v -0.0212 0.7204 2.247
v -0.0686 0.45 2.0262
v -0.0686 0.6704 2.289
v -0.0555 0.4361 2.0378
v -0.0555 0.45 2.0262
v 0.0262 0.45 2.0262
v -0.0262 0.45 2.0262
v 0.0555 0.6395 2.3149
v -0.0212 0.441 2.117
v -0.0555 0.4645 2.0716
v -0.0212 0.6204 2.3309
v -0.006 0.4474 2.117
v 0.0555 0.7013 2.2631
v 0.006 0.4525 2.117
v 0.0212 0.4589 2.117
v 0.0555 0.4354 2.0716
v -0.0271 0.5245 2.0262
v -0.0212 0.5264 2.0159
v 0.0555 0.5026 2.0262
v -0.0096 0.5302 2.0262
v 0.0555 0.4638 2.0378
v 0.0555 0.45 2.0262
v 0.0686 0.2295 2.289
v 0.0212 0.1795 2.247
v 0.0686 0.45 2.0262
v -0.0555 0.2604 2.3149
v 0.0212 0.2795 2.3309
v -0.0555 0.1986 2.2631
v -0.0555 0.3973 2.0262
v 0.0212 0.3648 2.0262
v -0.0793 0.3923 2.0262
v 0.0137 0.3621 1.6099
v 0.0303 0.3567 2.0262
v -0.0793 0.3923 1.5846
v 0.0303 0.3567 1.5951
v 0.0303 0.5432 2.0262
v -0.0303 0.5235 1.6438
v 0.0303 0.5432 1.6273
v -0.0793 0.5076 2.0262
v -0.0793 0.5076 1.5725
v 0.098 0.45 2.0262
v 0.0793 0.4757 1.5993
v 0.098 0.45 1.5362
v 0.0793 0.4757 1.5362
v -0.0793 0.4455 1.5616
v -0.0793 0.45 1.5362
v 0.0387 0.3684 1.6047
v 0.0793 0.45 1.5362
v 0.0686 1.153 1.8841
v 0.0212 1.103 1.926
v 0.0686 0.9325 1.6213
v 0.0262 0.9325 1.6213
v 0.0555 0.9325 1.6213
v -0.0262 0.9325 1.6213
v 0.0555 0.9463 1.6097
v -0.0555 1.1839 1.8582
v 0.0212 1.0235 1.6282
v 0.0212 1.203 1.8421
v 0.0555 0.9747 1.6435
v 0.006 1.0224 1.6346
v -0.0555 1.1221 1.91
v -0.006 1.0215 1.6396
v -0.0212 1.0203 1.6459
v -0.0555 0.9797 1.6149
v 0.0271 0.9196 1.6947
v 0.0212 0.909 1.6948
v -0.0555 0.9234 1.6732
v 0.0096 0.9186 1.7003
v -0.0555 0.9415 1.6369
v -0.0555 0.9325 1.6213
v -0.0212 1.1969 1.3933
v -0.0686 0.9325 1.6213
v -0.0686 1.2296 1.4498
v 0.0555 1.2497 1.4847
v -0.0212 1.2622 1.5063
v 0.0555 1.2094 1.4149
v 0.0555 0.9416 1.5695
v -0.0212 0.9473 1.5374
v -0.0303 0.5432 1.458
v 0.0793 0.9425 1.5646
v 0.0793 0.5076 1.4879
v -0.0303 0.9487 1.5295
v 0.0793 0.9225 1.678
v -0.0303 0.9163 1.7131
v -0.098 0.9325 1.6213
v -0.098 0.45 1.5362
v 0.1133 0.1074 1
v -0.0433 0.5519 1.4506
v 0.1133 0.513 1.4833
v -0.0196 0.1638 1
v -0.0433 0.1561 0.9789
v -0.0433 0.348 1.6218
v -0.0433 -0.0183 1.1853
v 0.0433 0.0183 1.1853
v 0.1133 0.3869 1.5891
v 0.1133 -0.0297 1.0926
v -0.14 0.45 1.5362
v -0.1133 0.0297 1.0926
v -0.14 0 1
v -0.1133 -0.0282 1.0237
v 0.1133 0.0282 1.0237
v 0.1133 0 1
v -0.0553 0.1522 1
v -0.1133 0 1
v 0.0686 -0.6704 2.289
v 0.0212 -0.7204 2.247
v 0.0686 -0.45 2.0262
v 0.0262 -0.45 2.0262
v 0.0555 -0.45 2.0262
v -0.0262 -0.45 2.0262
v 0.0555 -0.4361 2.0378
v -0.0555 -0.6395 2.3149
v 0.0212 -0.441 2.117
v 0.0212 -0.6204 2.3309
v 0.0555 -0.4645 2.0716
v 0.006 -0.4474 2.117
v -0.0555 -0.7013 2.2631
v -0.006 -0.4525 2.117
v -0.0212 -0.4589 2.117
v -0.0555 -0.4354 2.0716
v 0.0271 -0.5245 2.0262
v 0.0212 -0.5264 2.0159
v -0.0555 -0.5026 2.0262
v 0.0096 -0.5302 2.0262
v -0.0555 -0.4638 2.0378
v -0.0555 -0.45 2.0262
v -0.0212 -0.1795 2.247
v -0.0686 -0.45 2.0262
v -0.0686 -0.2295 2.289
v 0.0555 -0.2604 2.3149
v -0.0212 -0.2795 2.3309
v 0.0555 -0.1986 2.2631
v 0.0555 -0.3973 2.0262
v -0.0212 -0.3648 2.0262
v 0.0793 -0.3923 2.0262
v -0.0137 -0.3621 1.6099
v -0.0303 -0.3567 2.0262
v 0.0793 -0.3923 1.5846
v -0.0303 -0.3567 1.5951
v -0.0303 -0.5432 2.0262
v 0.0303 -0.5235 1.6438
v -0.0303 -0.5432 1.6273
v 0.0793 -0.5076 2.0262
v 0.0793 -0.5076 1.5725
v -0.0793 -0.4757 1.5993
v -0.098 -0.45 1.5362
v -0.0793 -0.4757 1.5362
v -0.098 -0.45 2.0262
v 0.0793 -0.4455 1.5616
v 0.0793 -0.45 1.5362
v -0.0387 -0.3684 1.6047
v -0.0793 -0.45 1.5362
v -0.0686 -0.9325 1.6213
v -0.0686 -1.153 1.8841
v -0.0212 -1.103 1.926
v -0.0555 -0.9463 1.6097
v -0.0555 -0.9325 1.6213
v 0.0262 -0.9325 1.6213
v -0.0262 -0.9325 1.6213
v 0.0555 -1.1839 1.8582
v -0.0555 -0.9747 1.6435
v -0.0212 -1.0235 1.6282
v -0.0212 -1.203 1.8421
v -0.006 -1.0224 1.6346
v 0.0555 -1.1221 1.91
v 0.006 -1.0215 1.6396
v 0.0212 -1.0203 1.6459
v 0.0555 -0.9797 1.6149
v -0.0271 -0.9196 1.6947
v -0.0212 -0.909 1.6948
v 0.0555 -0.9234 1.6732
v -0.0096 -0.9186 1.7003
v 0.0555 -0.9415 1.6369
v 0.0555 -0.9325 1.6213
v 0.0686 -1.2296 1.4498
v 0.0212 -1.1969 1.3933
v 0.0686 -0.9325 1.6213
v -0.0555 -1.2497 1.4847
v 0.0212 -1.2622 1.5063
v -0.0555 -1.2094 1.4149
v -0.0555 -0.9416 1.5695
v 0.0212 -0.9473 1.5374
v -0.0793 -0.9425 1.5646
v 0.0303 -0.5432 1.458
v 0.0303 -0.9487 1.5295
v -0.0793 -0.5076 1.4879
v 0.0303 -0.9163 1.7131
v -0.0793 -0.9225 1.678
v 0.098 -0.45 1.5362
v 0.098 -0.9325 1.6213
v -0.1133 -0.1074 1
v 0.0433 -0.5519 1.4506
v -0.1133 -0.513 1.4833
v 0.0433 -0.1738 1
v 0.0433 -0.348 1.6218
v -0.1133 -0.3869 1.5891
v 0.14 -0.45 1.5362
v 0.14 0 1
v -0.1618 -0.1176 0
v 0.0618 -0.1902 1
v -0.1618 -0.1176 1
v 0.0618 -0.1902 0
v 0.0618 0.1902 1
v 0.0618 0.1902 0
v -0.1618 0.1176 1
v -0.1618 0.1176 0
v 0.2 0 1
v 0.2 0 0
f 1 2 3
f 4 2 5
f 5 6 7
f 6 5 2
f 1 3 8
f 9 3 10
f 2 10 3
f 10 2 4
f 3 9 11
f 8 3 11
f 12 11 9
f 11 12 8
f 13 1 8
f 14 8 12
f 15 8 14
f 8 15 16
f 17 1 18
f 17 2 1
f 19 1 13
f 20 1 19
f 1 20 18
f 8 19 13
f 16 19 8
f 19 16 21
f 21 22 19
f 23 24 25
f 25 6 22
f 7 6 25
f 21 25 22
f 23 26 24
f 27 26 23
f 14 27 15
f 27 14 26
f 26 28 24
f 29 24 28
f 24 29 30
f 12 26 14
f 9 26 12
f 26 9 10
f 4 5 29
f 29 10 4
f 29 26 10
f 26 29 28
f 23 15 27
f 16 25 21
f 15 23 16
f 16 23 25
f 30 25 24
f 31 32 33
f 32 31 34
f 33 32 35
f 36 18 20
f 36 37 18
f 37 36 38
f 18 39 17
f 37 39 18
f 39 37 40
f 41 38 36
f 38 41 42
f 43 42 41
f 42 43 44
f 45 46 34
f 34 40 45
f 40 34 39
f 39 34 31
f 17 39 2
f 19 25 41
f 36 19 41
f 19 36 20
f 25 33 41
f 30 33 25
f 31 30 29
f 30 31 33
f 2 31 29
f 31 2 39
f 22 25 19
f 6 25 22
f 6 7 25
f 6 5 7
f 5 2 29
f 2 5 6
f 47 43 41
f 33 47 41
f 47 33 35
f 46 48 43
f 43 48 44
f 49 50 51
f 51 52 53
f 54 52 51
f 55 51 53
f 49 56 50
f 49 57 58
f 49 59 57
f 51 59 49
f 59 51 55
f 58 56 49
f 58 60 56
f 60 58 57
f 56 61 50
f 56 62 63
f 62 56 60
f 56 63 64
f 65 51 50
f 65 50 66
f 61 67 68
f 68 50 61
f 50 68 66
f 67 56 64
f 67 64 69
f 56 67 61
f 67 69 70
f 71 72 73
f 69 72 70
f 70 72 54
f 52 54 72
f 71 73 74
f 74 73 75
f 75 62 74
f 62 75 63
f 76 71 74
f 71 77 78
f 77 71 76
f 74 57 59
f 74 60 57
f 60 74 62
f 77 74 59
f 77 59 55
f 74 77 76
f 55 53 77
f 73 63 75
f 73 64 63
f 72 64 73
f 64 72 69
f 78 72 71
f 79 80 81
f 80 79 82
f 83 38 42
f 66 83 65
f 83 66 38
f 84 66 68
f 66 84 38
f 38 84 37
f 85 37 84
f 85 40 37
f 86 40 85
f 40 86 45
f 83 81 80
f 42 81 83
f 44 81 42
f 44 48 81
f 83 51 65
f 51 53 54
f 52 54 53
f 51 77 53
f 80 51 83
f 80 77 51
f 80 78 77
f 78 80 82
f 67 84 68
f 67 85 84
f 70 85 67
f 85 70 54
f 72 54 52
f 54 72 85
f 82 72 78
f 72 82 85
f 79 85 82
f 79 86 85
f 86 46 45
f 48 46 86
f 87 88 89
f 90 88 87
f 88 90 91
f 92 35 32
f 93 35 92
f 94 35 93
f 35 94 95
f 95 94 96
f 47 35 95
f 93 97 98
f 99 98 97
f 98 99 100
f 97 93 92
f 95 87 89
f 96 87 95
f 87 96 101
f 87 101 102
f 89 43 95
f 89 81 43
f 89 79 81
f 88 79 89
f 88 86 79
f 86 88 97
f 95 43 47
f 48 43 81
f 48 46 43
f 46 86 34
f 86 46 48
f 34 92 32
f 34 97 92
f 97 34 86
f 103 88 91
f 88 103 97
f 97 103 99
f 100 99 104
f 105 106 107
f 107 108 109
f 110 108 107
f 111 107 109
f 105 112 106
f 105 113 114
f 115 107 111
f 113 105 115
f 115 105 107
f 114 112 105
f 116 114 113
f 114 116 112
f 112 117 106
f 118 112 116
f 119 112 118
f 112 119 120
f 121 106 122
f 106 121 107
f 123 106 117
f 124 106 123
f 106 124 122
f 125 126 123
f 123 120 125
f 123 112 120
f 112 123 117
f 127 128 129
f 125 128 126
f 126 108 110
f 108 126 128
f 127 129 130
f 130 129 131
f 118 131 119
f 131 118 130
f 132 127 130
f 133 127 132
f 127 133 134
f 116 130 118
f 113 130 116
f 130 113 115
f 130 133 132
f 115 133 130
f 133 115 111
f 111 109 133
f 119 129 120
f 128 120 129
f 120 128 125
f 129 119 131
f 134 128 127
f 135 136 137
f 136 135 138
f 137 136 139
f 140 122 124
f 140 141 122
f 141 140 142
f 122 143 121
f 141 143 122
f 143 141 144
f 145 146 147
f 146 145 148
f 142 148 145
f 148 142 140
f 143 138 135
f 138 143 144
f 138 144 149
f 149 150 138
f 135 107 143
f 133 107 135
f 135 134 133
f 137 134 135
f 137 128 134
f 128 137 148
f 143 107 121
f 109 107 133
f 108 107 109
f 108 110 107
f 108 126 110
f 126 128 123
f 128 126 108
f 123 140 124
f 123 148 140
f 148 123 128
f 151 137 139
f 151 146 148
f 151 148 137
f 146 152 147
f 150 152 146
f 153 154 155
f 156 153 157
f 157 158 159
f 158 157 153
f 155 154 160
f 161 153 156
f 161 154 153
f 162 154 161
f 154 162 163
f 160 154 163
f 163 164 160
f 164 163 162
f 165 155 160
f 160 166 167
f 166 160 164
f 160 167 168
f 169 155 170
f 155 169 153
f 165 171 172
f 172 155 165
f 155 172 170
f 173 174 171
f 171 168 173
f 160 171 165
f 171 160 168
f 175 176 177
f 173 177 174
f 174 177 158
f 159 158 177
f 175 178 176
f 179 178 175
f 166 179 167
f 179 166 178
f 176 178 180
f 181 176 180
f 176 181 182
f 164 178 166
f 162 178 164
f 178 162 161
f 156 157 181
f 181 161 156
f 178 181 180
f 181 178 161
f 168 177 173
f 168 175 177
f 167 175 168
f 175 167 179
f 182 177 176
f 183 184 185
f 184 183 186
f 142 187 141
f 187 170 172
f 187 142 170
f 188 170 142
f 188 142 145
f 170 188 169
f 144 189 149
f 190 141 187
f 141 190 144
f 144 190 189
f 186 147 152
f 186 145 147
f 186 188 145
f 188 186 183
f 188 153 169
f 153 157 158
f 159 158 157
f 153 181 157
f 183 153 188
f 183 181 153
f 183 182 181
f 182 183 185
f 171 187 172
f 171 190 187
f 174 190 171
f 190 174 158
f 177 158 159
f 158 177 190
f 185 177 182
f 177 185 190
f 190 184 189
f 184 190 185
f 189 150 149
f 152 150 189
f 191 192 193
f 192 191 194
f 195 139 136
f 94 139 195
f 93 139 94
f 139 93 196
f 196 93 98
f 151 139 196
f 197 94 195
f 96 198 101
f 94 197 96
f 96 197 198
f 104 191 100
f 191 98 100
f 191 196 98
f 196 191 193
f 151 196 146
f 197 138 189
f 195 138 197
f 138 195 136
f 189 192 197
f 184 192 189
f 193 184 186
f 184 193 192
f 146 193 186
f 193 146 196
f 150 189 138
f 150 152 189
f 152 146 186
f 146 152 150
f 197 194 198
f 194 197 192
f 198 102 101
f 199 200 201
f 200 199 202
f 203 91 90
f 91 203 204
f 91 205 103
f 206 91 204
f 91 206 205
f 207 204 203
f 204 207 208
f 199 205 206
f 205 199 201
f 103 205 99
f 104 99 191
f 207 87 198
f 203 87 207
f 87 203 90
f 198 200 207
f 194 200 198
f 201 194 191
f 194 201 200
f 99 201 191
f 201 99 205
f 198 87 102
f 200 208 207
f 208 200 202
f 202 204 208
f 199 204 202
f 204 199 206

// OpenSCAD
// Volume: 0.225341700846619, SurfaceArea: 4.47487753109404
module tree(currentScale, levels)
{
  h = currentScale;
  w = currentScale/5;
  childScale = currentScale * 0.7;
  
  if (levels > 0) {
    cylinder(r=w, h=h);
    translate([0,0,h]) for (i = [1:2]) {
      rotate([40, 0, i * 180]) tree(childScale, levels-1);
    }
  }
}

tree(1, 4);
